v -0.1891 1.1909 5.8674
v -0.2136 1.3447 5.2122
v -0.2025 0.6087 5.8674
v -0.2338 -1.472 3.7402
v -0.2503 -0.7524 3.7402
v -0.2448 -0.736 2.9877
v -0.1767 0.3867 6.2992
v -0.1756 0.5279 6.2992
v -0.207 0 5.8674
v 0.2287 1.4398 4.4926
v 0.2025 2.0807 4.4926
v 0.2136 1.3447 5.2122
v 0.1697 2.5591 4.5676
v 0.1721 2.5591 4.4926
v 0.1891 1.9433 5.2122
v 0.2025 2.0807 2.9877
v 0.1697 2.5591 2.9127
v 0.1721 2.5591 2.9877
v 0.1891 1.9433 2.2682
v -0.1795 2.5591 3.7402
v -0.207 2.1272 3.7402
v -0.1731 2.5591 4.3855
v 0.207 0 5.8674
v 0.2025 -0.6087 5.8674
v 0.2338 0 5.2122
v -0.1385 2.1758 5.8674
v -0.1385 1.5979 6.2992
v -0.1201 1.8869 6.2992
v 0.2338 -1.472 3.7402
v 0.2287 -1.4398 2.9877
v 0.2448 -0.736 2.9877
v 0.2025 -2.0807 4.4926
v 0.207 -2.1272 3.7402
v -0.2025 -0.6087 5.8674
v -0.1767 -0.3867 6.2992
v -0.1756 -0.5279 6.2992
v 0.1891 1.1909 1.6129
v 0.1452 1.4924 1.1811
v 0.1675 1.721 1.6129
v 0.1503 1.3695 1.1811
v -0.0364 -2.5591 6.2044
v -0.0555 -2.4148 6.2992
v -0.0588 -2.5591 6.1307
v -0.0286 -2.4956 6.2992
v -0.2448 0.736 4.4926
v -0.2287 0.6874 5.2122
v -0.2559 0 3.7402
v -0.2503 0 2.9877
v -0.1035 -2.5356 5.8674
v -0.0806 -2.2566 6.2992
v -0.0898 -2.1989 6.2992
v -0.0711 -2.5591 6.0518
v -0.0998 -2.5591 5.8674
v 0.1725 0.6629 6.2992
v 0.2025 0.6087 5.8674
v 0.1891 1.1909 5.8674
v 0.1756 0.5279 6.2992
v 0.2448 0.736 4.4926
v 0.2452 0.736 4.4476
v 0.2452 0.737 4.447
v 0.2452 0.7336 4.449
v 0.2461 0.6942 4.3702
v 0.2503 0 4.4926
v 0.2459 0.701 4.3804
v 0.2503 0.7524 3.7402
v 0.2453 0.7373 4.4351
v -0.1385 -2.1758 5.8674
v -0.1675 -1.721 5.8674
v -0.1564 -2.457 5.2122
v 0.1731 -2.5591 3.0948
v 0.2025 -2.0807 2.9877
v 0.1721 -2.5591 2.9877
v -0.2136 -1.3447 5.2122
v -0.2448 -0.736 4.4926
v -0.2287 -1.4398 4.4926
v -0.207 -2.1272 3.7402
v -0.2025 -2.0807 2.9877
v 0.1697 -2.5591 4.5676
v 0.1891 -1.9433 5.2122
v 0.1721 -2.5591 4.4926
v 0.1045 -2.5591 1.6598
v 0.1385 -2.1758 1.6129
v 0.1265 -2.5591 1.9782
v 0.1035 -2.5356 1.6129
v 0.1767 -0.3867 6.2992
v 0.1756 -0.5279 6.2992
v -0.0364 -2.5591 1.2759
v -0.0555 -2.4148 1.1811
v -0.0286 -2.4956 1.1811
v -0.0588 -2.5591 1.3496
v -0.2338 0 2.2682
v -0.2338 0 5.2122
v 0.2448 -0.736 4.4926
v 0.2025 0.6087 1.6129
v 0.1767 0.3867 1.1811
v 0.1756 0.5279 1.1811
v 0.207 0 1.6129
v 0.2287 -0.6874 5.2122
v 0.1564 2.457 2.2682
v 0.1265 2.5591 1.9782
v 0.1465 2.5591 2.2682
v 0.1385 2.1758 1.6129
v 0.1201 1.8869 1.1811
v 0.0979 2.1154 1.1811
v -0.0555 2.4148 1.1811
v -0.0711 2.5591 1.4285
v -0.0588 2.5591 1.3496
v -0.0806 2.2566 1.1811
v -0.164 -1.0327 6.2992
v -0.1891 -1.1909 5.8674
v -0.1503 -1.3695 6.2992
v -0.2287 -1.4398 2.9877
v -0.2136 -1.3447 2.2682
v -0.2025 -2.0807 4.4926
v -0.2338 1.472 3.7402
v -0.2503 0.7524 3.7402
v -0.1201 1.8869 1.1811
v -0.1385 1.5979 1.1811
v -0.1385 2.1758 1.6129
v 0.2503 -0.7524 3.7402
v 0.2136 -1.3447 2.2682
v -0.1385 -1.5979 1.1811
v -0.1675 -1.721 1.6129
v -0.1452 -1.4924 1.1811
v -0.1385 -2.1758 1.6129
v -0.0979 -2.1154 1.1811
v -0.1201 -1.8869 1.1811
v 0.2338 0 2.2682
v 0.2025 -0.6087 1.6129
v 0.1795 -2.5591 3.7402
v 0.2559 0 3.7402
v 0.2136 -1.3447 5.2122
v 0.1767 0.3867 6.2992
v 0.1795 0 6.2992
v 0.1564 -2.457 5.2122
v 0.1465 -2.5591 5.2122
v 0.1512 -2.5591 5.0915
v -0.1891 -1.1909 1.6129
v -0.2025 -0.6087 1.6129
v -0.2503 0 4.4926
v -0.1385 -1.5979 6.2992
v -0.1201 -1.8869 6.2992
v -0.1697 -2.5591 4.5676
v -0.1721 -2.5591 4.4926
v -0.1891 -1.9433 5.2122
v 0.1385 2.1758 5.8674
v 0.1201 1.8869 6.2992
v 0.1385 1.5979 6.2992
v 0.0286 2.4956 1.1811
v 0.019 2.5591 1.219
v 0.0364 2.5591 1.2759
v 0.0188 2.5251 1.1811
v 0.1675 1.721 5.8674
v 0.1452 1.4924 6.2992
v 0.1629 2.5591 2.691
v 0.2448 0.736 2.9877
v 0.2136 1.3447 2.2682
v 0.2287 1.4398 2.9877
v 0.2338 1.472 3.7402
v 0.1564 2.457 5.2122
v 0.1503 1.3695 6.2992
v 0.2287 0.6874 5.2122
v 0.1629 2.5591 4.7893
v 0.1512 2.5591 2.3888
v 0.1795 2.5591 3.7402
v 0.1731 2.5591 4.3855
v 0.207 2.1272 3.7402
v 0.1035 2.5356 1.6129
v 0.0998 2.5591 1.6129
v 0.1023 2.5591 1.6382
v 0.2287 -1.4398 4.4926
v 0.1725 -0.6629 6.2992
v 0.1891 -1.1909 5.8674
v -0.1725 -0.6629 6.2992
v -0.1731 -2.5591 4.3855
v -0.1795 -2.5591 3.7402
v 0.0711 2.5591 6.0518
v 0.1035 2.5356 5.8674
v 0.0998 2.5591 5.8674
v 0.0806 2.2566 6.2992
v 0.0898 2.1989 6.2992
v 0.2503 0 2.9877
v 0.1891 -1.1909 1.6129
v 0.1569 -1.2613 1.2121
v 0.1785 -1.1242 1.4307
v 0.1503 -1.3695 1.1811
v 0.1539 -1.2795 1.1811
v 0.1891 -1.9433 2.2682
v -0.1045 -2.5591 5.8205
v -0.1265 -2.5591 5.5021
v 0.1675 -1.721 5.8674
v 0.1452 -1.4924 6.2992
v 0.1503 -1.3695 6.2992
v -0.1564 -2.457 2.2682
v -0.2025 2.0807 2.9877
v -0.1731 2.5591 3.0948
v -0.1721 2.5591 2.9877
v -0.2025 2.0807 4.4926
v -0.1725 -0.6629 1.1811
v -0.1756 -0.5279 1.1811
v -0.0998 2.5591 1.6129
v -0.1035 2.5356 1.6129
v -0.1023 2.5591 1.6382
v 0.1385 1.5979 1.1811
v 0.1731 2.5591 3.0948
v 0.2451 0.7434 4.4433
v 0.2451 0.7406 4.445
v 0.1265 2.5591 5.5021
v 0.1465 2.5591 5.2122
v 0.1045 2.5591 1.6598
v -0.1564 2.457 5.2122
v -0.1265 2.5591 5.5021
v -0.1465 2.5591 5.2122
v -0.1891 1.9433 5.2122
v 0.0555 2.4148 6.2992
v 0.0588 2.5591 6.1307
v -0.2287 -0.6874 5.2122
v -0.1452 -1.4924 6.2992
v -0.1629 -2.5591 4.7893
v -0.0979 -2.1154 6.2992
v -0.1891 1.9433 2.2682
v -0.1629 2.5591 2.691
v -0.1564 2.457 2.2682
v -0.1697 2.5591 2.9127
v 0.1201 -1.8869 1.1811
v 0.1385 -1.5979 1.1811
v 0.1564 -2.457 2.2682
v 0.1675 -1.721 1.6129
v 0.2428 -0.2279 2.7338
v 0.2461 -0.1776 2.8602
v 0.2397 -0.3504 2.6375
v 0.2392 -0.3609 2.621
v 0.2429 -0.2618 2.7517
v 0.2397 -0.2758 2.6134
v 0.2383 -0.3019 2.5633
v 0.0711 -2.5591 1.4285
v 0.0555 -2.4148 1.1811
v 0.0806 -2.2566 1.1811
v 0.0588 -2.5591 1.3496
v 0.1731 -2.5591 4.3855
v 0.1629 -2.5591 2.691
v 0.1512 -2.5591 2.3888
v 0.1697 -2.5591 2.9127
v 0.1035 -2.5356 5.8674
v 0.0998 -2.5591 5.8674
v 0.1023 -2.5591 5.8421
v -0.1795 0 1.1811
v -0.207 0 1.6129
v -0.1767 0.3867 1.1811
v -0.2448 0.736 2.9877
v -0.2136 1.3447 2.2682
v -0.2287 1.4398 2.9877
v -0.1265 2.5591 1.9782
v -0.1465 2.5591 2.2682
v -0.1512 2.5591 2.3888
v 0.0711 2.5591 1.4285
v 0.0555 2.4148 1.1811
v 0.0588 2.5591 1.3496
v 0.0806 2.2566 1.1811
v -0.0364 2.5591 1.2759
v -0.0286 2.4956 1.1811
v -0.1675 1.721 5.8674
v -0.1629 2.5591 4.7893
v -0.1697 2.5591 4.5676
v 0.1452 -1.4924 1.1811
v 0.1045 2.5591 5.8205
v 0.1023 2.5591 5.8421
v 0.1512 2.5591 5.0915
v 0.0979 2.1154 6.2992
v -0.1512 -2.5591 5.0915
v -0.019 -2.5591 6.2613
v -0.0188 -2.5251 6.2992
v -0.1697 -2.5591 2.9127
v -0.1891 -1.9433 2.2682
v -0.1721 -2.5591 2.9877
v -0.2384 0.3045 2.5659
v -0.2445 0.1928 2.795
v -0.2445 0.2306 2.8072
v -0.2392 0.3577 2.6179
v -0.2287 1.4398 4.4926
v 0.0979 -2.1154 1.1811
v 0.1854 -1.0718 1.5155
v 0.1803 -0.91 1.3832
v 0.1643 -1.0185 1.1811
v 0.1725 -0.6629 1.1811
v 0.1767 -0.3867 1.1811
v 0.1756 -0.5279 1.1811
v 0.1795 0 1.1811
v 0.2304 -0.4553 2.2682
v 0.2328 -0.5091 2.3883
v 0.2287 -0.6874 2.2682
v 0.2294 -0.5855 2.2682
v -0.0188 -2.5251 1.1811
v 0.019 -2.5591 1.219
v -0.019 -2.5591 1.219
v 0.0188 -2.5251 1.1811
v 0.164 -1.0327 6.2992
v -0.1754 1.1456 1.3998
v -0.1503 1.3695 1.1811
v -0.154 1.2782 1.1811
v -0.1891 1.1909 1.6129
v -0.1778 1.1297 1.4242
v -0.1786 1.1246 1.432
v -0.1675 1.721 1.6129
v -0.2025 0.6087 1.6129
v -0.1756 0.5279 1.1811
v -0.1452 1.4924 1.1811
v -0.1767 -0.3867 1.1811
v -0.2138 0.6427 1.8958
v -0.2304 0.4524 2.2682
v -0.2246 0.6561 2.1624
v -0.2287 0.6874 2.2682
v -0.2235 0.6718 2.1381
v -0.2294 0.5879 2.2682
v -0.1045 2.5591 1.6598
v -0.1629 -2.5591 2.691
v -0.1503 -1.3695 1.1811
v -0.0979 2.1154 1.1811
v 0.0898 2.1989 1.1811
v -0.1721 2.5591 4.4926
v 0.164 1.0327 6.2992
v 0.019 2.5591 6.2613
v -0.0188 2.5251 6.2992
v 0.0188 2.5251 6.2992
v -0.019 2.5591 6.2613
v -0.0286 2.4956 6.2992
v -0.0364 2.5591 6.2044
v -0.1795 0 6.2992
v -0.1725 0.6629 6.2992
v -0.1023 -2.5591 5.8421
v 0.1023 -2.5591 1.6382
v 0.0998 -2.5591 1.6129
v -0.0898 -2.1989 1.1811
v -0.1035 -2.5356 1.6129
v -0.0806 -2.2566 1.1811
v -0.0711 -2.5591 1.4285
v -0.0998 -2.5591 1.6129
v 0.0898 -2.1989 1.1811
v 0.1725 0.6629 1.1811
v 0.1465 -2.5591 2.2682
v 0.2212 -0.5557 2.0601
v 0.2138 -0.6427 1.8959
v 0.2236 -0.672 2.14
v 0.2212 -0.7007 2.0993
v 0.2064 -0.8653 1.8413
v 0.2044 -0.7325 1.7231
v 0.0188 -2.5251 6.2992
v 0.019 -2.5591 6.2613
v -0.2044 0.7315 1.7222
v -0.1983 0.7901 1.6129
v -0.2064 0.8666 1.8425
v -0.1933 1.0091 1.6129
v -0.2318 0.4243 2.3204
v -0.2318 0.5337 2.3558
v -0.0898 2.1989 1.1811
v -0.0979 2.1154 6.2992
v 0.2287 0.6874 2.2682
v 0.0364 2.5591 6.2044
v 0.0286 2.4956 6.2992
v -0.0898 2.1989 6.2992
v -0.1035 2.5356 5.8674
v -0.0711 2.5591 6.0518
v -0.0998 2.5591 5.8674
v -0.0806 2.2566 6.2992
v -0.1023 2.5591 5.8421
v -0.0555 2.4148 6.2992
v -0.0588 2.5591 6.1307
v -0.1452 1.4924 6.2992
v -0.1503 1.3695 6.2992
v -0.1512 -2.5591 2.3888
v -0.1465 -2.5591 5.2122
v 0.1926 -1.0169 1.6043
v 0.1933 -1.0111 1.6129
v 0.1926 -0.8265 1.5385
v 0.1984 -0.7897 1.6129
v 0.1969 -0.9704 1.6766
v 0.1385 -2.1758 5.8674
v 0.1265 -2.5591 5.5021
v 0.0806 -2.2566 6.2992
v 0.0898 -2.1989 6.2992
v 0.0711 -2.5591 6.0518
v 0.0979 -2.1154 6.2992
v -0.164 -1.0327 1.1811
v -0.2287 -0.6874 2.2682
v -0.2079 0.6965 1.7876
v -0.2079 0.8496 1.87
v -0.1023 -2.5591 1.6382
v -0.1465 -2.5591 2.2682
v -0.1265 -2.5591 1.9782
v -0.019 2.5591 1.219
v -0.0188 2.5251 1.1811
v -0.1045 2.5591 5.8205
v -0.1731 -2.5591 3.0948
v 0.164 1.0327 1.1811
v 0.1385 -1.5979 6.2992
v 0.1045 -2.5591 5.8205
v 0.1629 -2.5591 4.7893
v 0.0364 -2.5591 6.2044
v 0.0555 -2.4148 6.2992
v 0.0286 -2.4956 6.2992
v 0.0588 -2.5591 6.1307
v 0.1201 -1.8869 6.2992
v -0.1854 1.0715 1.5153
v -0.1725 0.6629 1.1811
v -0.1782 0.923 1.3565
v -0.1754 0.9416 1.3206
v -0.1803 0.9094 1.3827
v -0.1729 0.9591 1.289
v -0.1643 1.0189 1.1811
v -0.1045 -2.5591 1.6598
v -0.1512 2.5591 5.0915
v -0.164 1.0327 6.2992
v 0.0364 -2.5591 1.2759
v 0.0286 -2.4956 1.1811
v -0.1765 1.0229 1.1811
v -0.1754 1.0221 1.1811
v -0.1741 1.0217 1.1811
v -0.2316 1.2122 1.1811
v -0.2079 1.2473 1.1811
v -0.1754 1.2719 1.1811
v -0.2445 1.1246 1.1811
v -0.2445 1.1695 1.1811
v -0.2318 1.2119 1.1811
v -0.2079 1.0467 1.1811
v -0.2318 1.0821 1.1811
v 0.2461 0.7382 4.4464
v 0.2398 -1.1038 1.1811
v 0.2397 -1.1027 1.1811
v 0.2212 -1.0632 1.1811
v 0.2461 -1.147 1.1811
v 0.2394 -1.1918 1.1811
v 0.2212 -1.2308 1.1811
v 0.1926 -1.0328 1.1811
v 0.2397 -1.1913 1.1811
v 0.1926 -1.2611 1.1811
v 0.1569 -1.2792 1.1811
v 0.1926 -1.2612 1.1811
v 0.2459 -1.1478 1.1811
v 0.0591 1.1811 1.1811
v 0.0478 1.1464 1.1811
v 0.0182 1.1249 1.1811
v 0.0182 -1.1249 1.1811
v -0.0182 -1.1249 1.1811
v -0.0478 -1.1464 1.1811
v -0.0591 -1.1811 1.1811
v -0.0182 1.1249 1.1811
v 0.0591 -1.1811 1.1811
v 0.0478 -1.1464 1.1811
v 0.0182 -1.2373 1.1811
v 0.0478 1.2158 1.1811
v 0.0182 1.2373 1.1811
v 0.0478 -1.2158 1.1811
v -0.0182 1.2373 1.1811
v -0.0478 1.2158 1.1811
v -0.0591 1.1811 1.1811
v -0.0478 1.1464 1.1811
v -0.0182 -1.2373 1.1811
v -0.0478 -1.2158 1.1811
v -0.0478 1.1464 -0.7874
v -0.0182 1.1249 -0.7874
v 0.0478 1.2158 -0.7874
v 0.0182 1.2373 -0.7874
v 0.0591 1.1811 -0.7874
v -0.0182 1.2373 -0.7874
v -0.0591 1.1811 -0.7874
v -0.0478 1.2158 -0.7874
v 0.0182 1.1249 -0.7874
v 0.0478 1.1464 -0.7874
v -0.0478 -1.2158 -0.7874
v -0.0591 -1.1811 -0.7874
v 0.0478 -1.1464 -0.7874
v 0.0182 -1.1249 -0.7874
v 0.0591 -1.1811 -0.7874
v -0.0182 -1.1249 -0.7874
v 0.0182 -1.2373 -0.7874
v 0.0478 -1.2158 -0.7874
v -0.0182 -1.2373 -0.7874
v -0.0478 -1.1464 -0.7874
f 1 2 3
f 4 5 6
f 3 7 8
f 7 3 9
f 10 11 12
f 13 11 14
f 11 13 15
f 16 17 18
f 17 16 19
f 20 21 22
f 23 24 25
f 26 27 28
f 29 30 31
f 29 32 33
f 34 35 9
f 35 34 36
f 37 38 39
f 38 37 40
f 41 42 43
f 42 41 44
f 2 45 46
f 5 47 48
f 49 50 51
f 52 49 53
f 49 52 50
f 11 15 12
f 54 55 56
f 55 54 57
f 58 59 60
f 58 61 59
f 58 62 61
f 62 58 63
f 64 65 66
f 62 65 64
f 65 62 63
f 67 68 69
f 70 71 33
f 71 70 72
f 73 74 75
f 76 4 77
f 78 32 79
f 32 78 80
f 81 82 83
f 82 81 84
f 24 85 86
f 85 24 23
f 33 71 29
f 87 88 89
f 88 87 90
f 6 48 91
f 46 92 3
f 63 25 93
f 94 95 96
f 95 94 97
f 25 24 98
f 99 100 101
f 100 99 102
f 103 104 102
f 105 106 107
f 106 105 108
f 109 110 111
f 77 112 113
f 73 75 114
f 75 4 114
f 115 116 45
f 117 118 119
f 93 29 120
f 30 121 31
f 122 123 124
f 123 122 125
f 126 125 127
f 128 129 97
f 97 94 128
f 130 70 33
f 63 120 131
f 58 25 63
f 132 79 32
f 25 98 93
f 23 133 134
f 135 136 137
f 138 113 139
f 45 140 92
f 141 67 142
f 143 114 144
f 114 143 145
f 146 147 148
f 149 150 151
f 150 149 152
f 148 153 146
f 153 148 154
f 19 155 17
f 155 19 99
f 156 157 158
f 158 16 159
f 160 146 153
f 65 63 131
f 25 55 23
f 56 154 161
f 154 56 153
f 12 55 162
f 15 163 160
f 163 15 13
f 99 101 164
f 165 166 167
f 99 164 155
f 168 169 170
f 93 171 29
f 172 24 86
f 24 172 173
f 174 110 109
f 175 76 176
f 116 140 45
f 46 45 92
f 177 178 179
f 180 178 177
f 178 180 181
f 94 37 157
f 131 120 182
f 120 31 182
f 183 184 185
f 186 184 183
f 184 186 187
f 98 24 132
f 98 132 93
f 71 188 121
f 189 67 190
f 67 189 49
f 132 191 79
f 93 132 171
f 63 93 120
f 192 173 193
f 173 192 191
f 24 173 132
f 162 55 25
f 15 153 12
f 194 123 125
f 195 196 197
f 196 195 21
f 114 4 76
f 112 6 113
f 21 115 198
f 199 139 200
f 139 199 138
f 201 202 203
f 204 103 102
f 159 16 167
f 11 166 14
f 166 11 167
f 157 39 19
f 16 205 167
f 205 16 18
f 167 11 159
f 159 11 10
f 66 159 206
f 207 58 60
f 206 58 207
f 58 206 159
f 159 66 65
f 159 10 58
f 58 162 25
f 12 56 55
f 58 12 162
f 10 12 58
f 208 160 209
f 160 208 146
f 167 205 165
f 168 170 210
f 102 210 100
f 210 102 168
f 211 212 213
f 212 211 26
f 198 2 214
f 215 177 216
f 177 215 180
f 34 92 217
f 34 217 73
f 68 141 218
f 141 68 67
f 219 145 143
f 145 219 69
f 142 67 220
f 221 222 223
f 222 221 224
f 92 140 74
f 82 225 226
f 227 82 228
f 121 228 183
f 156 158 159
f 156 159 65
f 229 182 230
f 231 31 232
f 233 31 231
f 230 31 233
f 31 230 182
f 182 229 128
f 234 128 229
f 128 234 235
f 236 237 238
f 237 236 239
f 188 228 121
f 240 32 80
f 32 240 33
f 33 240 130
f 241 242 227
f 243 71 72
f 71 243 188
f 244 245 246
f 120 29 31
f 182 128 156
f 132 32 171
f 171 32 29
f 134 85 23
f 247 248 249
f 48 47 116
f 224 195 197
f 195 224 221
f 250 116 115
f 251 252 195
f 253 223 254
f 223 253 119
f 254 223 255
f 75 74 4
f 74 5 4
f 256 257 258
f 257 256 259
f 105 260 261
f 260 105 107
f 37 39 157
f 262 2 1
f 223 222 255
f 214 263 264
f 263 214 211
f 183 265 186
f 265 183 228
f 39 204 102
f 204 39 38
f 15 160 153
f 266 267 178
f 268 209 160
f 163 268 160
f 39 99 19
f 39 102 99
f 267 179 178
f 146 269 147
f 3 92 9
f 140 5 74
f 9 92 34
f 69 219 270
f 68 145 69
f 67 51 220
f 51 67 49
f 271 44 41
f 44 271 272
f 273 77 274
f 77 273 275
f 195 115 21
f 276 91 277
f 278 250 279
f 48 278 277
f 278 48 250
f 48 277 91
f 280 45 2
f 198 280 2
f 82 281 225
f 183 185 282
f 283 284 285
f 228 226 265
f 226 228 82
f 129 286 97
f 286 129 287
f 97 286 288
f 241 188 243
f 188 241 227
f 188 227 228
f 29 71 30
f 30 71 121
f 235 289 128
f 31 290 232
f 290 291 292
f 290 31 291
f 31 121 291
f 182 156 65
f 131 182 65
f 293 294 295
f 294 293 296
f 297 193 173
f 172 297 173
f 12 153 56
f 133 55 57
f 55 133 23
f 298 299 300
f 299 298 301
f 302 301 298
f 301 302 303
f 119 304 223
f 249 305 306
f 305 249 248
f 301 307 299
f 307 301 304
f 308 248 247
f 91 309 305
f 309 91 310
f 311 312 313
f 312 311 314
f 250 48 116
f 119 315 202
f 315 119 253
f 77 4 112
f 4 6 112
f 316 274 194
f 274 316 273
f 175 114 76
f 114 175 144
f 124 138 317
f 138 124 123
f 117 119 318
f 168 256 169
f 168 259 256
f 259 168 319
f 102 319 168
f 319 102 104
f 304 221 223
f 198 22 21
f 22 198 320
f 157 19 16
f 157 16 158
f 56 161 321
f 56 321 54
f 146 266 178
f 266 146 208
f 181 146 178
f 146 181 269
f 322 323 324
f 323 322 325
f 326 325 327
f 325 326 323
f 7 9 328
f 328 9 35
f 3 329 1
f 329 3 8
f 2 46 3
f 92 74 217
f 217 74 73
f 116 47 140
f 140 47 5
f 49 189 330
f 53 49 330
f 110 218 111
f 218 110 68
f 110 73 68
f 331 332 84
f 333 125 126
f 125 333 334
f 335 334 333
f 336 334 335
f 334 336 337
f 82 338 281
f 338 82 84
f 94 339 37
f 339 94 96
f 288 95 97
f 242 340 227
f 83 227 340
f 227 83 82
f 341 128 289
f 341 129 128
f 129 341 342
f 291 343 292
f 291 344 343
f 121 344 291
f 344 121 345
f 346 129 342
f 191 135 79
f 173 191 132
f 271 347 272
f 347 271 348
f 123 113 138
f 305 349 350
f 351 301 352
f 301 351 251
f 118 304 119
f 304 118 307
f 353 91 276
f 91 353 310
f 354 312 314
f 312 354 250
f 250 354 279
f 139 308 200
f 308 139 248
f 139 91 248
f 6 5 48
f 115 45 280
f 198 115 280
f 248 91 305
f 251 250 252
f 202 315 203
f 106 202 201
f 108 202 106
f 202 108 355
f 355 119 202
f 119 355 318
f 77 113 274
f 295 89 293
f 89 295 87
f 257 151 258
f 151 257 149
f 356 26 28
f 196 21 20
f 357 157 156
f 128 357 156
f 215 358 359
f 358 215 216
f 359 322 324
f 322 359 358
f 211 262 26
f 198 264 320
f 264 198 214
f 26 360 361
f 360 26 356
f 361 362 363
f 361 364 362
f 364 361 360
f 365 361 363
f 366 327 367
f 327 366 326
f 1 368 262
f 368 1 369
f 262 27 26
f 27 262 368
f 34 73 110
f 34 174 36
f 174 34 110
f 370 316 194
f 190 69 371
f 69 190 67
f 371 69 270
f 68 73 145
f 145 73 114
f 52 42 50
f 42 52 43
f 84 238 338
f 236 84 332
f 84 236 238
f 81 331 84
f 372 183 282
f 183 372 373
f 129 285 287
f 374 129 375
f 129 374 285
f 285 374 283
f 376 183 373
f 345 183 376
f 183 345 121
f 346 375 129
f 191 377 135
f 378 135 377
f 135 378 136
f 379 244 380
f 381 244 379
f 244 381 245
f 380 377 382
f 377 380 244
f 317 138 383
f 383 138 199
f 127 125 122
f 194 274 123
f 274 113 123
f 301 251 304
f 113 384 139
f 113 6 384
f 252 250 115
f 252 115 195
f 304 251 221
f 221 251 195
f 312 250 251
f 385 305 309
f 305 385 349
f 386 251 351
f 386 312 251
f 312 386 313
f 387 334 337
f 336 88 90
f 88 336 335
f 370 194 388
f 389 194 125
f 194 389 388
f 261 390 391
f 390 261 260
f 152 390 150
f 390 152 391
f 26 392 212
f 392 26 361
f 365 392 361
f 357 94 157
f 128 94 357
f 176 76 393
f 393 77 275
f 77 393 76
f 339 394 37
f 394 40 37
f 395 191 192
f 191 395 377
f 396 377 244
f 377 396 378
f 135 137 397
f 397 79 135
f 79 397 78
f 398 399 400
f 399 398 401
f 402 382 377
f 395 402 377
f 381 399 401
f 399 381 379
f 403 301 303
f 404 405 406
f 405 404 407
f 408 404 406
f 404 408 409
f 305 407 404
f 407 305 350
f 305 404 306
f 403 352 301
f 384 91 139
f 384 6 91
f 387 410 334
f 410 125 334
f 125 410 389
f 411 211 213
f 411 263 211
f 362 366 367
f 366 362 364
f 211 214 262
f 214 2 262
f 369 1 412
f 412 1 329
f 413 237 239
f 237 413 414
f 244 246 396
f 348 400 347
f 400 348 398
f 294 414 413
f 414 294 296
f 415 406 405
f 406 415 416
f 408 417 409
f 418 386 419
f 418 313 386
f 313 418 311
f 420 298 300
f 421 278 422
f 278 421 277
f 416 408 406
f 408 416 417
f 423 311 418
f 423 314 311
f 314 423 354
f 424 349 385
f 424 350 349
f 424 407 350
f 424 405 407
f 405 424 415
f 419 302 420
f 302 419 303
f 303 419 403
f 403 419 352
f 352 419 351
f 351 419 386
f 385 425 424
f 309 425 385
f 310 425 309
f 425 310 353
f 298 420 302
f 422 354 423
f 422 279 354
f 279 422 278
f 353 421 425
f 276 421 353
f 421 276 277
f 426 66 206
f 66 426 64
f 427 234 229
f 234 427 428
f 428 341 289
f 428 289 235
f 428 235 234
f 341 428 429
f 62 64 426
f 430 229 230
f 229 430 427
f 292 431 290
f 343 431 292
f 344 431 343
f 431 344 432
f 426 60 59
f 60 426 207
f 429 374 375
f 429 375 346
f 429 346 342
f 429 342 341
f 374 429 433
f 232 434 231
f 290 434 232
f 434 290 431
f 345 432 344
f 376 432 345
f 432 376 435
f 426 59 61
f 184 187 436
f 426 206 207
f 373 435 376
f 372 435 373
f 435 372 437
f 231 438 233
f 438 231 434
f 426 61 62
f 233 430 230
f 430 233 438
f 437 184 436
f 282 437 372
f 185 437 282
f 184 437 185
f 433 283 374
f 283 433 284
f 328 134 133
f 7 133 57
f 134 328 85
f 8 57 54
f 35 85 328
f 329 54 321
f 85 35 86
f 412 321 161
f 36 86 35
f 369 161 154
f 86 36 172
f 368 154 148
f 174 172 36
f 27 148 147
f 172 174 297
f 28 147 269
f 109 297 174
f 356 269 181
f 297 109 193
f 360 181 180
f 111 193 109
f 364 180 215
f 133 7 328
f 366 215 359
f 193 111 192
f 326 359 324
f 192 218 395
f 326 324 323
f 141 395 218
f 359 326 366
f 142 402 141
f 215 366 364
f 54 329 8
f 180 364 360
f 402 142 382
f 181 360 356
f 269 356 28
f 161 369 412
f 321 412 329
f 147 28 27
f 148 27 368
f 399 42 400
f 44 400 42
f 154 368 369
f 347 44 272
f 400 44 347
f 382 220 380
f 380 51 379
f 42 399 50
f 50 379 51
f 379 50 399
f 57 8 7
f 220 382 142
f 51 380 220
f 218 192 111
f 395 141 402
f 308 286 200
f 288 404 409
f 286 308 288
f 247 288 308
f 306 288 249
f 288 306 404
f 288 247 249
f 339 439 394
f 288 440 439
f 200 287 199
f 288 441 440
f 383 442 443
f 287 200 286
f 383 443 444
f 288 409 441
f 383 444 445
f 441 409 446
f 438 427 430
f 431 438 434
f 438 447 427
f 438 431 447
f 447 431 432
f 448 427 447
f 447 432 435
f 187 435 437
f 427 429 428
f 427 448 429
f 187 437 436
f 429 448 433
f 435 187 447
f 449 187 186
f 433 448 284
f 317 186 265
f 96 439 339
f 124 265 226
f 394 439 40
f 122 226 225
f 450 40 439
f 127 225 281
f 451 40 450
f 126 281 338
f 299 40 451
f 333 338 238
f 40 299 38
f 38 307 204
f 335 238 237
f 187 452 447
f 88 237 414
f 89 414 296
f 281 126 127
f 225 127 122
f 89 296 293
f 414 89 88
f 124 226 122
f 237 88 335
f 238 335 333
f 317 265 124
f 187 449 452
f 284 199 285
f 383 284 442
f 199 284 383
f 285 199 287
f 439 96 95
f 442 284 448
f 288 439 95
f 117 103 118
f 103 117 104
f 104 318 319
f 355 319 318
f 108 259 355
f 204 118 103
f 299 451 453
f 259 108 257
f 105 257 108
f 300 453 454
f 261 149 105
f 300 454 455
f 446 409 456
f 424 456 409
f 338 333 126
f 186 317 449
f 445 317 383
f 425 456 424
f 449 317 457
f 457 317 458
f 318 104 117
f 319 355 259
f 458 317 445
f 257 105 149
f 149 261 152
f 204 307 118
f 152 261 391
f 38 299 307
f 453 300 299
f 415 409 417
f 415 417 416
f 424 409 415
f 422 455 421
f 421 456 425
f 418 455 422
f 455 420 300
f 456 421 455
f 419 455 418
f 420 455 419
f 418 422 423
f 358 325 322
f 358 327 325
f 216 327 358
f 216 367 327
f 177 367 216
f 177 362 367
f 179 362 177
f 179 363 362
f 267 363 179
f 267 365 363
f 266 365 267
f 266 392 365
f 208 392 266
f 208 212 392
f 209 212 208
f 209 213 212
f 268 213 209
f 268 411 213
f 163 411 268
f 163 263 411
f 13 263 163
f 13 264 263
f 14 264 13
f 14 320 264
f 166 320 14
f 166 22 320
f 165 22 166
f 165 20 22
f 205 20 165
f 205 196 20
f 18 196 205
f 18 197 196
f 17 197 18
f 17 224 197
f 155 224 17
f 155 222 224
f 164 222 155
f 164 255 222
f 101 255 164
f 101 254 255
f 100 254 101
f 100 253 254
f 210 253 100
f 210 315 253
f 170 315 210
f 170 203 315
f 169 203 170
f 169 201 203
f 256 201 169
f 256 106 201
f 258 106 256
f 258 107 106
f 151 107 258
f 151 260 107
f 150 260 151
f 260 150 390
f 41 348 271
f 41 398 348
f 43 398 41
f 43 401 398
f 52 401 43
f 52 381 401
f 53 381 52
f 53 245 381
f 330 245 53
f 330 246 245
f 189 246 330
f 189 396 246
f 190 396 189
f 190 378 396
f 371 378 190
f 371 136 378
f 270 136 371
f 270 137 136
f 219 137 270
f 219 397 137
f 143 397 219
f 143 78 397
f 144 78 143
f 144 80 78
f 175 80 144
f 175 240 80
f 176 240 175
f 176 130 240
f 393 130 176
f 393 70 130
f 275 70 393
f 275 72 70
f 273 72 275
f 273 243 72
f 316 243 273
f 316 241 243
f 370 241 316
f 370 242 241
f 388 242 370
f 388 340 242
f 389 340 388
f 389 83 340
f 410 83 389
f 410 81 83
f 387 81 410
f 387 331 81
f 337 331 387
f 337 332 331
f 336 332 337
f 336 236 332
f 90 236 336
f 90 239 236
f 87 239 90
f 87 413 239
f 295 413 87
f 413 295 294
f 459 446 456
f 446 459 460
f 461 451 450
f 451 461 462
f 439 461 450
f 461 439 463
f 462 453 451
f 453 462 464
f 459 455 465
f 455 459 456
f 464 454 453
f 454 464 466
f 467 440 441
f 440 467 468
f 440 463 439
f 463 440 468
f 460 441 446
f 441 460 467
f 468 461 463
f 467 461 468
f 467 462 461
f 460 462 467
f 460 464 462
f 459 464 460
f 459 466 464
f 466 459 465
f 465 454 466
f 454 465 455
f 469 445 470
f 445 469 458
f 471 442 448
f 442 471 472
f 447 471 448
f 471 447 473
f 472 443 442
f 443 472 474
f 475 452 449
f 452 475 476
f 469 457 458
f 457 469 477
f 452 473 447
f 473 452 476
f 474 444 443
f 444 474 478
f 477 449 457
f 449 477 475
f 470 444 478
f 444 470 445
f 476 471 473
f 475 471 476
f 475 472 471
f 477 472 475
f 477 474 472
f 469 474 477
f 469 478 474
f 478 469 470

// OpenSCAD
$fs = 0.1;
underground = 2;

module square(size, pin_dist) {
	_inch = 1 / 2.54;
	upground = 3;
	wire = 0.3;
	scale([_inch, _inch, _inch])
	translate([0, 0, size / 2 + upground]) {
		color("red") {
			intersection() {
				union() {
					resize([size / 10, 0, 0])
					sphere(d = size * sqrt(2));

					translate([-size / 40, pin_dist / 2, -size / 2 - wire / 2])
					rotate(a = 30, v = [1, 0, 0])
					cylinder(h = size * 0.75, r = wire);

					translate([size / 40, -pin_dist / 2, -size / 2 - wire / 2])
					rotate(a = 30, v = [-1, 0, 0])
					cylinder(h = size * 0.75, r = wire);
				}
		
				translate([-size / 2, -size / 2, -size / 2])
				cube(size);
			}
		}
		
		translate([0, pin_dist / 2, -(size / 2 + upground + underground)])
		cylinder(h = upground + underground, d = wire);

		translate([0, -pin_dist / 2, -(size / 2 + upground + underground)])
		cylinder(h = upground + underground, d = wire);
	}
}

//square(5, 2.5);
//square(8, 4.5);
//square(10, 5.5);
//square(11.5, 5.5);
square(13, 6);
